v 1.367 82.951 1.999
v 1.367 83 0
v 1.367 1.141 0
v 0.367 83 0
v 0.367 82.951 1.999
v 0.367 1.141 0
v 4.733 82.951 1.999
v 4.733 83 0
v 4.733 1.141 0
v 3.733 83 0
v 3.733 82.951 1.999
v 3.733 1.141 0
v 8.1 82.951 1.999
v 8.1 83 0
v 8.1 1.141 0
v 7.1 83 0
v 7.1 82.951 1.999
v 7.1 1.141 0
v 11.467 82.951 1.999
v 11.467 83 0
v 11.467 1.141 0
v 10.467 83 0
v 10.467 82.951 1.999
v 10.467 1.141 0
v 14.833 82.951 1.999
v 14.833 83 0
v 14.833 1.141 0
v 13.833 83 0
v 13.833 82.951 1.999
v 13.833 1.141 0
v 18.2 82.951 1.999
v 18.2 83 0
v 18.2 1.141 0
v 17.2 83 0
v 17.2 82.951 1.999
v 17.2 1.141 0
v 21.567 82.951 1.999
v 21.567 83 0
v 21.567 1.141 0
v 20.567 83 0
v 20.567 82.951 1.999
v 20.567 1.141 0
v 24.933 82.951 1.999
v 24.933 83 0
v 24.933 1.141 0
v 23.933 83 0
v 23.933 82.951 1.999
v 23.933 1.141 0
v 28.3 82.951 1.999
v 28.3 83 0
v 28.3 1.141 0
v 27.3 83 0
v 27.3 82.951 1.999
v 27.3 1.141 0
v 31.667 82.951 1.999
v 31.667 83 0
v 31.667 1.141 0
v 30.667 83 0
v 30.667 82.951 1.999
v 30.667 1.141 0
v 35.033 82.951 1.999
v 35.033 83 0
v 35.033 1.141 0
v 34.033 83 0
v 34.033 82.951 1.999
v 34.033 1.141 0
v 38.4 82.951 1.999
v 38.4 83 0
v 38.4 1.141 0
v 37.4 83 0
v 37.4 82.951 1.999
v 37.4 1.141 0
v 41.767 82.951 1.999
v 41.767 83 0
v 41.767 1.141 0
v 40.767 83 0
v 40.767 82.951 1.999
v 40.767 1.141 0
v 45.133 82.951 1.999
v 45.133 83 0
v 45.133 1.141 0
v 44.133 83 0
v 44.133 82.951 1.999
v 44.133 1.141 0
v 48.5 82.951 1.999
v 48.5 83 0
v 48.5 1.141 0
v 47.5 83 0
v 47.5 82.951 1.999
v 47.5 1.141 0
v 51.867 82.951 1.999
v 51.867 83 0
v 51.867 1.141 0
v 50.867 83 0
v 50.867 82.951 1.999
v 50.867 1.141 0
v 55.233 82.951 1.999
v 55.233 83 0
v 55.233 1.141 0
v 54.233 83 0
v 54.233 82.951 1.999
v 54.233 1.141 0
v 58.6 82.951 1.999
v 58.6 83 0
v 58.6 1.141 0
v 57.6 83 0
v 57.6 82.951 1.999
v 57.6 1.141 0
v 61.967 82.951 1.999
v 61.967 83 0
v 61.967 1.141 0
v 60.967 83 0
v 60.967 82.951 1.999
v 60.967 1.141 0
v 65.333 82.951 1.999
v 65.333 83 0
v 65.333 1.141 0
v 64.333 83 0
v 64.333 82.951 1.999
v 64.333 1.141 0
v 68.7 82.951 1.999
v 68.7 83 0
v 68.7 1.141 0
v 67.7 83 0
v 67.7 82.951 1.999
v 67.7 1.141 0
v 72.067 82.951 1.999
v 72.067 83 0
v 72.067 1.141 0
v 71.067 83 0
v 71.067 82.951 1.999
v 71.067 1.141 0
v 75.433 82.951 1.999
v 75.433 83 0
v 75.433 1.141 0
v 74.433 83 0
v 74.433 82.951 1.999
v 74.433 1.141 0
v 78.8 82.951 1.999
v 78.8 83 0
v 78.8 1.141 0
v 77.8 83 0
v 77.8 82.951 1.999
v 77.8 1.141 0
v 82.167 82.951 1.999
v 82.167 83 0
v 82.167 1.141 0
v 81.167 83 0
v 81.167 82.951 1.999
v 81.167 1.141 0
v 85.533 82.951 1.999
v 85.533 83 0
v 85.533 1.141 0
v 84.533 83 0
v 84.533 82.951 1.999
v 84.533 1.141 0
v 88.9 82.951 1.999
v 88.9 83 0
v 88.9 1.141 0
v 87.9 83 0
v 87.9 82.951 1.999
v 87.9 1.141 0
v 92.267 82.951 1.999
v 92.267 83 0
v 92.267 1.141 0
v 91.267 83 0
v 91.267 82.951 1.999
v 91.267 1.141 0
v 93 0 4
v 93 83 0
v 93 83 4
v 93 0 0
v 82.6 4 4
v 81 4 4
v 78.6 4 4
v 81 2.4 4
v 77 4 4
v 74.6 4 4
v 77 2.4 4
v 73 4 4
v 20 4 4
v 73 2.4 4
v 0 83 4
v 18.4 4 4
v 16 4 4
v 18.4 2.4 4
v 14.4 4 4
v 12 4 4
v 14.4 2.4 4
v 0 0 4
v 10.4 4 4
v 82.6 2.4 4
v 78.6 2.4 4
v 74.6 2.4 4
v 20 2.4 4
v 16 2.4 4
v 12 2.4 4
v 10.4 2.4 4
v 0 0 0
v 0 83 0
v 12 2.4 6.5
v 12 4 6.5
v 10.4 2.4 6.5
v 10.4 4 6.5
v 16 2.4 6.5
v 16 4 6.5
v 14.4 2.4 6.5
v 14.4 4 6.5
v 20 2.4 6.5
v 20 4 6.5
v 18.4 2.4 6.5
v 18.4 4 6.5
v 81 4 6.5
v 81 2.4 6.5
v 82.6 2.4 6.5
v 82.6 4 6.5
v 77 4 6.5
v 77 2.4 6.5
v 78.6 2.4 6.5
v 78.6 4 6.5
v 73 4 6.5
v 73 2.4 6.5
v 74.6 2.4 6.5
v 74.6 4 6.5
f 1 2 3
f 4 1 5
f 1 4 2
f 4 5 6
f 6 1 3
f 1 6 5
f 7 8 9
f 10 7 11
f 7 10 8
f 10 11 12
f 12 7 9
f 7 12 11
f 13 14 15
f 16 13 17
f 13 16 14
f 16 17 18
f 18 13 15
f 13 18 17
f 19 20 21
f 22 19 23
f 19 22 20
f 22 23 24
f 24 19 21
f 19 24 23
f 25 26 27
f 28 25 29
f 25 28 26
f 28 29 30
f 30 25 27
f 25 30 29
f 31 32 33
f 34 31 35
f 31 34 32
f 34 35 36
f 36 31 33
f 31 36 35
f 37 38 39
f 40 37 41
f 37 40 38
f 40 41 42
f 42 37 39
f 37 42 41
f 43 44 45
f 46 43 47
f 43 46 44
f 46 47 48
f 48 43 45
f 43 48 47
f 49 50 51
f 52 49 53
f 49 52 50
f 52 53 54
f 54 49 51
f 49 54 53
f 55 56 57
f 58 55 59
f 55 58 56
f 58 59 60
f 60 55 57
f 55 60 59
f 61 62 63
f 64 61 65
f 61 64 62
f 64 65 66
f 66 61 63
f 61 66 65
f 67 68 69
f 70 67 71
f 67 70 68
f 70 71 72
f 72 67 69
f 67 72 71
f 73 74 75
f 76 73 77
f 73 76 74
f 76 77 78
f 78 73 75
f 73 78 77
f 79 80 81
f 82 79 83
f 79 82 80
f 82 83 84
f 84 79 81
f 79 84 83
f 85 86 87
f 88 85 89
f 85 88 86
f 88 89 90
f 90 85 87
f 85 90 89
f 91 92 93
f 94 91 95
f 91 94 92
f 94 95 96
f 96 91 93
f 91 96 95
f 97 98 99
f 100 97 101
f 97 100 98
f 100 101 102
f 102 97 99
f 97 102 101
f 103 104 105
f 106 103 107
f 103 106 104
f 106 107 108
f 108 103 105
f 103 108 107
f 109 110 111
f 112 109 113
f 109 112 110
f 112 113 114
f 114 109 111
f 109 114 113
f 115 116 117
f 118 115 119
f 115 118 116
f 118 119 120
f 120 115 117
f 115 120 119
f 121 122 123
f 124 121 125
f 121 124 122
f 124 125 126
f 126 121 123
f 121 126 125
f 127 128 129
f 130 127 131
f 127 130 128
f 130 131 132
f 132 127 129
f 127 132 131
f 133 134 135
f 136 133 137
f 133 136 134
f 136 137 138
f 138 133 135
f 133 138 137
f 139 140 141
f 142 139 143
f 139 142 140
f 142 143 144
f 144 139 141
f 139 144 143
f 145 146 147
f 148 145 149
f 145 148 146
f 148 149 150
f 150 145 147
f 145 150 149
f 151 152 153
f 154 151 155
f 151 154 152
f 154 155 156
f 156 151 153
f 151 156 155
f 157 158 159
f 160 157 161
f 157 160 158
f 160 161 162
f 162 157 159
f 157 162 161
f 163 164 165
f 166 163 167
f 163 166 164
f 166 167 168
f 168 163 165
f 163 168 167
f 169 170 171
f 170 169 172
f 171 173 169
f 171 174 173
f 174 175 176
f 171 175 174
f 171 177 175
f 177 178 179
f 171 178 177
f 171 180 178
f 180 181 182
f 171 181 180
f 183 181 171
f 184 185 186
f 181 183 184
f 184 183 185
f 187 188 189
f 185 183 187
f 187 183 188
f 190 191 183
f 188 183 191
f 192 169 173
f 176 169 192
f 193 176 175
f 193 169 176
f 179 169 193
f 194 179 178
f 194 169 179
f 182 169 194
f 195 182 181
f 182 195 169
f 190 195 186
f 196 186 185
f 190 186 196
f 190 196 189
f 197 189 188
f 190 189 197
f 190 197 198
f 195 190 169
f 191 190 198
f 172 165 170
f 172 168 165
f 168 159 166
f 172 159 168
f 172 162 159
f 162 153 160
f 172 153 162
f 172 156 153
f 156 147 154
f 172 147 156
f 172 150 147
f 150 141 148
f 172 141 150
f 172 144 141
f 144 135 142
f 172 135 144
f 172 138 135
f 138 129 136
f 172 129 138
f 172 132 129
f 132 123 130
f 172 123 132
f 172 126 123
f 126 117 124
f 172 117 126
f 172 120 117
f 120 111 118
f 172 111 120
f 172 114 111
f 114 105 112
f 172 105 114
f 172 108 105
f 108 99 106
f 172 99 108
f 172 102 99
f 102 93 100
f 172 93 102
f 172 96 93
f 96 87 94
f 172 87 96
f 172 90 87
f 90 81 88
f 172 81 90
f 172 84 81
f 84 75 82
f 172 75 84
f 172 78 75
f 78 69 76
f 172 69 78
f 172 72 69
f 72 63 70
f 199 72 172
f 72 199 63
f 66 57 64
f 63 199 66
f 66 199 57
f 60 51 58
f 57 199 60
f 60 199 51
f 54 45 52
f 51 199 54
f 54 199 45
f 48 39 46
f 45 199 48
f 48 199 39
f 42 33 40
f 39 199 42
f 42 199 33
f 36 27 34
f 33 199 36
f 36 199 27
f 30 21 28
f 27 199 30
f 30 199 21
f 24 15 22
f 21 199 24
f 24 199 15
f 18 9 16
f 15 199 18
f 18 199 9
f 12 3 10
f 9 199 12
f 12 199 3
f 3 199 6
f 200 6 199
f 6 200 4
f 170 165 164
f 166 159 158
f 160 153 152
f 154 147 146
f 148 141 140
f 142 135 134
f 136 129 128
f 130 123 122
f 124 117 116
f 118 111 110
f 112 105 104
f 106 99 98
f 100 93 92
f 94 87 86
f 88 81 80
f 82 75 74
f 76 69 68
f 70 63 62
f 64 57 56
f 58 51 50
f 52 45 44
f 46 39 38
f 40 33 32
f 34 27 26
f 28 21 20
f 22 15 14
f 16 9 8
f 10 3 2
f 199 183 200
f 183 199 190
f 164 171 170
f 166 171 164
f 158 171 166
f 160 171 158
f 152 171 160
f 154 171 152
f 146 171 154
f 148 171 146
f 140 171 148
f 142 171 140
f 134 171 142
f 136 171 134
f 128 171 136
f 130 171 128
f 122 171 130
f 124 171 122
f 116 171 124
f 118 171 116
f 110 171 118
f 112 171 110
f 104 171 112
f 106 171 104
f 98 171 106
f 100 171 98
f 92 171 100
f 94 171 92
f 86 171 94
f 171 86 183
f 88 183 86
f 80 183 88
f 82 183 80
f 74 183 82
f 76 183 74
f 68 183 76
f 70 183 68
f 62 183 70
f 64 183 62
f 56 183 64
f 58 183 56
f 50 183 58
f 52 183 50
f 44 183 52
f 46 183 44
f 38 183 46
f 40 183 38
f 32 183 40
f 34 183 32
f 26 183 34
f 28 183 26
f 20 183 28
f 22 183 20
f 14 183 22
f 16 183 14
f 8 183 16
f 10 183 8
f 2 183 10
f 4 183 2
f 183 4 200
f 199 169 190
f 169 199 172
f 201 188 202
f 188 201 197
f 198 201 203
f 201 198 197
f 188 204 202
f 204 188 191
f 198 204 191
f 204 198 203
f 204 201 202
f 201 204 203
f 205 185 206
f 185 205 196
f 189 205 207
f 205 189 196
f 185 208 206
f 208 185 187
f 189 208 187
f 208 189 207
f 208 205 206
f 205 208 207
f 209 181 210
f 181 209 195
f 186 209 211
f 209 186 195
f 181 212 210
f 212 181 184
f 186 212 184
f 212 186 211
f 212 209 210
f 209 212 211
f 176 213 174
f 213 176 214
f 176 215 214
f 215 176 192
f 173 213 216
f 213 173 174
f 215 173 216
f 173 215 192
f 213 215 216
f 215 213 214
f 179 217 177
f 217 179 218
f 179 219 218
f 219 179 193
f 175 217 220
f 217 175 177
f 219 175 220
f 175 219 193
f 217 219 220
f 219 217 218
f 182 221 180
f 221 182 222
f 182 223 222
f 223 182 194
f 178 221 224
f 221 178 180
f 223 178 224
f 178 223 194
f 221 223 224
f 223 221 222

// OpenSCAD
// file: Connector.scad
module Connector(width, height, depth) {
    for ( i = [0 : 2] ) {
        translate([10 + (2+2)*i+(2.4-width)/2, 0, 0])
            cube([width, depth, height]);
    }
}
// main file
use <./Connector.scad>;


module Columns(num_column=10, column_x=1, column_y=1, column_height=80, length=100) {
    interval = length/num_column;
    for ( i = [0 : num_column] ) {
        translate([interval*i, 0, 0]) {
            cube([column_x, column_y, column_height]);
        }
    }
}

W = 93;
H = 83;
THICKNESS = 4;
// ["normal", "wide"]
TYPE = "normal";

// wall
difference() {
    union() {
        cube([W, H, THICKNESS]);
        if (TYPE == "wide") {
            translate([-THICKNESS, 0, 0])
                cube([THICKNESS, H, THICKNESS]);
            translate([W, 0, 0])
                cube([THICKNESS, H, THICKNESS]);
        }
    }

    // groove
    translate([-THICKNESS+1, H, 0])
        rotate([1.4, 0, 0])
            rotate([90, 0, 0])
                Columns(
                    num_column=30,
                    column_x=1,
                    column_y=2,
                    column_height=H*1.1,
                    length=W+2*THICKNESS
                );
}

translate([0, 2+2, THICKNESS-1])
    rotate([90, 0, 0]) {
        Connector(1.6, 1.6, 2.5+1);
            translate([W, 0, ])
                mirror([1, 0, 0])
                    Connector(1.6, 1.6, 2.5+1);
}
